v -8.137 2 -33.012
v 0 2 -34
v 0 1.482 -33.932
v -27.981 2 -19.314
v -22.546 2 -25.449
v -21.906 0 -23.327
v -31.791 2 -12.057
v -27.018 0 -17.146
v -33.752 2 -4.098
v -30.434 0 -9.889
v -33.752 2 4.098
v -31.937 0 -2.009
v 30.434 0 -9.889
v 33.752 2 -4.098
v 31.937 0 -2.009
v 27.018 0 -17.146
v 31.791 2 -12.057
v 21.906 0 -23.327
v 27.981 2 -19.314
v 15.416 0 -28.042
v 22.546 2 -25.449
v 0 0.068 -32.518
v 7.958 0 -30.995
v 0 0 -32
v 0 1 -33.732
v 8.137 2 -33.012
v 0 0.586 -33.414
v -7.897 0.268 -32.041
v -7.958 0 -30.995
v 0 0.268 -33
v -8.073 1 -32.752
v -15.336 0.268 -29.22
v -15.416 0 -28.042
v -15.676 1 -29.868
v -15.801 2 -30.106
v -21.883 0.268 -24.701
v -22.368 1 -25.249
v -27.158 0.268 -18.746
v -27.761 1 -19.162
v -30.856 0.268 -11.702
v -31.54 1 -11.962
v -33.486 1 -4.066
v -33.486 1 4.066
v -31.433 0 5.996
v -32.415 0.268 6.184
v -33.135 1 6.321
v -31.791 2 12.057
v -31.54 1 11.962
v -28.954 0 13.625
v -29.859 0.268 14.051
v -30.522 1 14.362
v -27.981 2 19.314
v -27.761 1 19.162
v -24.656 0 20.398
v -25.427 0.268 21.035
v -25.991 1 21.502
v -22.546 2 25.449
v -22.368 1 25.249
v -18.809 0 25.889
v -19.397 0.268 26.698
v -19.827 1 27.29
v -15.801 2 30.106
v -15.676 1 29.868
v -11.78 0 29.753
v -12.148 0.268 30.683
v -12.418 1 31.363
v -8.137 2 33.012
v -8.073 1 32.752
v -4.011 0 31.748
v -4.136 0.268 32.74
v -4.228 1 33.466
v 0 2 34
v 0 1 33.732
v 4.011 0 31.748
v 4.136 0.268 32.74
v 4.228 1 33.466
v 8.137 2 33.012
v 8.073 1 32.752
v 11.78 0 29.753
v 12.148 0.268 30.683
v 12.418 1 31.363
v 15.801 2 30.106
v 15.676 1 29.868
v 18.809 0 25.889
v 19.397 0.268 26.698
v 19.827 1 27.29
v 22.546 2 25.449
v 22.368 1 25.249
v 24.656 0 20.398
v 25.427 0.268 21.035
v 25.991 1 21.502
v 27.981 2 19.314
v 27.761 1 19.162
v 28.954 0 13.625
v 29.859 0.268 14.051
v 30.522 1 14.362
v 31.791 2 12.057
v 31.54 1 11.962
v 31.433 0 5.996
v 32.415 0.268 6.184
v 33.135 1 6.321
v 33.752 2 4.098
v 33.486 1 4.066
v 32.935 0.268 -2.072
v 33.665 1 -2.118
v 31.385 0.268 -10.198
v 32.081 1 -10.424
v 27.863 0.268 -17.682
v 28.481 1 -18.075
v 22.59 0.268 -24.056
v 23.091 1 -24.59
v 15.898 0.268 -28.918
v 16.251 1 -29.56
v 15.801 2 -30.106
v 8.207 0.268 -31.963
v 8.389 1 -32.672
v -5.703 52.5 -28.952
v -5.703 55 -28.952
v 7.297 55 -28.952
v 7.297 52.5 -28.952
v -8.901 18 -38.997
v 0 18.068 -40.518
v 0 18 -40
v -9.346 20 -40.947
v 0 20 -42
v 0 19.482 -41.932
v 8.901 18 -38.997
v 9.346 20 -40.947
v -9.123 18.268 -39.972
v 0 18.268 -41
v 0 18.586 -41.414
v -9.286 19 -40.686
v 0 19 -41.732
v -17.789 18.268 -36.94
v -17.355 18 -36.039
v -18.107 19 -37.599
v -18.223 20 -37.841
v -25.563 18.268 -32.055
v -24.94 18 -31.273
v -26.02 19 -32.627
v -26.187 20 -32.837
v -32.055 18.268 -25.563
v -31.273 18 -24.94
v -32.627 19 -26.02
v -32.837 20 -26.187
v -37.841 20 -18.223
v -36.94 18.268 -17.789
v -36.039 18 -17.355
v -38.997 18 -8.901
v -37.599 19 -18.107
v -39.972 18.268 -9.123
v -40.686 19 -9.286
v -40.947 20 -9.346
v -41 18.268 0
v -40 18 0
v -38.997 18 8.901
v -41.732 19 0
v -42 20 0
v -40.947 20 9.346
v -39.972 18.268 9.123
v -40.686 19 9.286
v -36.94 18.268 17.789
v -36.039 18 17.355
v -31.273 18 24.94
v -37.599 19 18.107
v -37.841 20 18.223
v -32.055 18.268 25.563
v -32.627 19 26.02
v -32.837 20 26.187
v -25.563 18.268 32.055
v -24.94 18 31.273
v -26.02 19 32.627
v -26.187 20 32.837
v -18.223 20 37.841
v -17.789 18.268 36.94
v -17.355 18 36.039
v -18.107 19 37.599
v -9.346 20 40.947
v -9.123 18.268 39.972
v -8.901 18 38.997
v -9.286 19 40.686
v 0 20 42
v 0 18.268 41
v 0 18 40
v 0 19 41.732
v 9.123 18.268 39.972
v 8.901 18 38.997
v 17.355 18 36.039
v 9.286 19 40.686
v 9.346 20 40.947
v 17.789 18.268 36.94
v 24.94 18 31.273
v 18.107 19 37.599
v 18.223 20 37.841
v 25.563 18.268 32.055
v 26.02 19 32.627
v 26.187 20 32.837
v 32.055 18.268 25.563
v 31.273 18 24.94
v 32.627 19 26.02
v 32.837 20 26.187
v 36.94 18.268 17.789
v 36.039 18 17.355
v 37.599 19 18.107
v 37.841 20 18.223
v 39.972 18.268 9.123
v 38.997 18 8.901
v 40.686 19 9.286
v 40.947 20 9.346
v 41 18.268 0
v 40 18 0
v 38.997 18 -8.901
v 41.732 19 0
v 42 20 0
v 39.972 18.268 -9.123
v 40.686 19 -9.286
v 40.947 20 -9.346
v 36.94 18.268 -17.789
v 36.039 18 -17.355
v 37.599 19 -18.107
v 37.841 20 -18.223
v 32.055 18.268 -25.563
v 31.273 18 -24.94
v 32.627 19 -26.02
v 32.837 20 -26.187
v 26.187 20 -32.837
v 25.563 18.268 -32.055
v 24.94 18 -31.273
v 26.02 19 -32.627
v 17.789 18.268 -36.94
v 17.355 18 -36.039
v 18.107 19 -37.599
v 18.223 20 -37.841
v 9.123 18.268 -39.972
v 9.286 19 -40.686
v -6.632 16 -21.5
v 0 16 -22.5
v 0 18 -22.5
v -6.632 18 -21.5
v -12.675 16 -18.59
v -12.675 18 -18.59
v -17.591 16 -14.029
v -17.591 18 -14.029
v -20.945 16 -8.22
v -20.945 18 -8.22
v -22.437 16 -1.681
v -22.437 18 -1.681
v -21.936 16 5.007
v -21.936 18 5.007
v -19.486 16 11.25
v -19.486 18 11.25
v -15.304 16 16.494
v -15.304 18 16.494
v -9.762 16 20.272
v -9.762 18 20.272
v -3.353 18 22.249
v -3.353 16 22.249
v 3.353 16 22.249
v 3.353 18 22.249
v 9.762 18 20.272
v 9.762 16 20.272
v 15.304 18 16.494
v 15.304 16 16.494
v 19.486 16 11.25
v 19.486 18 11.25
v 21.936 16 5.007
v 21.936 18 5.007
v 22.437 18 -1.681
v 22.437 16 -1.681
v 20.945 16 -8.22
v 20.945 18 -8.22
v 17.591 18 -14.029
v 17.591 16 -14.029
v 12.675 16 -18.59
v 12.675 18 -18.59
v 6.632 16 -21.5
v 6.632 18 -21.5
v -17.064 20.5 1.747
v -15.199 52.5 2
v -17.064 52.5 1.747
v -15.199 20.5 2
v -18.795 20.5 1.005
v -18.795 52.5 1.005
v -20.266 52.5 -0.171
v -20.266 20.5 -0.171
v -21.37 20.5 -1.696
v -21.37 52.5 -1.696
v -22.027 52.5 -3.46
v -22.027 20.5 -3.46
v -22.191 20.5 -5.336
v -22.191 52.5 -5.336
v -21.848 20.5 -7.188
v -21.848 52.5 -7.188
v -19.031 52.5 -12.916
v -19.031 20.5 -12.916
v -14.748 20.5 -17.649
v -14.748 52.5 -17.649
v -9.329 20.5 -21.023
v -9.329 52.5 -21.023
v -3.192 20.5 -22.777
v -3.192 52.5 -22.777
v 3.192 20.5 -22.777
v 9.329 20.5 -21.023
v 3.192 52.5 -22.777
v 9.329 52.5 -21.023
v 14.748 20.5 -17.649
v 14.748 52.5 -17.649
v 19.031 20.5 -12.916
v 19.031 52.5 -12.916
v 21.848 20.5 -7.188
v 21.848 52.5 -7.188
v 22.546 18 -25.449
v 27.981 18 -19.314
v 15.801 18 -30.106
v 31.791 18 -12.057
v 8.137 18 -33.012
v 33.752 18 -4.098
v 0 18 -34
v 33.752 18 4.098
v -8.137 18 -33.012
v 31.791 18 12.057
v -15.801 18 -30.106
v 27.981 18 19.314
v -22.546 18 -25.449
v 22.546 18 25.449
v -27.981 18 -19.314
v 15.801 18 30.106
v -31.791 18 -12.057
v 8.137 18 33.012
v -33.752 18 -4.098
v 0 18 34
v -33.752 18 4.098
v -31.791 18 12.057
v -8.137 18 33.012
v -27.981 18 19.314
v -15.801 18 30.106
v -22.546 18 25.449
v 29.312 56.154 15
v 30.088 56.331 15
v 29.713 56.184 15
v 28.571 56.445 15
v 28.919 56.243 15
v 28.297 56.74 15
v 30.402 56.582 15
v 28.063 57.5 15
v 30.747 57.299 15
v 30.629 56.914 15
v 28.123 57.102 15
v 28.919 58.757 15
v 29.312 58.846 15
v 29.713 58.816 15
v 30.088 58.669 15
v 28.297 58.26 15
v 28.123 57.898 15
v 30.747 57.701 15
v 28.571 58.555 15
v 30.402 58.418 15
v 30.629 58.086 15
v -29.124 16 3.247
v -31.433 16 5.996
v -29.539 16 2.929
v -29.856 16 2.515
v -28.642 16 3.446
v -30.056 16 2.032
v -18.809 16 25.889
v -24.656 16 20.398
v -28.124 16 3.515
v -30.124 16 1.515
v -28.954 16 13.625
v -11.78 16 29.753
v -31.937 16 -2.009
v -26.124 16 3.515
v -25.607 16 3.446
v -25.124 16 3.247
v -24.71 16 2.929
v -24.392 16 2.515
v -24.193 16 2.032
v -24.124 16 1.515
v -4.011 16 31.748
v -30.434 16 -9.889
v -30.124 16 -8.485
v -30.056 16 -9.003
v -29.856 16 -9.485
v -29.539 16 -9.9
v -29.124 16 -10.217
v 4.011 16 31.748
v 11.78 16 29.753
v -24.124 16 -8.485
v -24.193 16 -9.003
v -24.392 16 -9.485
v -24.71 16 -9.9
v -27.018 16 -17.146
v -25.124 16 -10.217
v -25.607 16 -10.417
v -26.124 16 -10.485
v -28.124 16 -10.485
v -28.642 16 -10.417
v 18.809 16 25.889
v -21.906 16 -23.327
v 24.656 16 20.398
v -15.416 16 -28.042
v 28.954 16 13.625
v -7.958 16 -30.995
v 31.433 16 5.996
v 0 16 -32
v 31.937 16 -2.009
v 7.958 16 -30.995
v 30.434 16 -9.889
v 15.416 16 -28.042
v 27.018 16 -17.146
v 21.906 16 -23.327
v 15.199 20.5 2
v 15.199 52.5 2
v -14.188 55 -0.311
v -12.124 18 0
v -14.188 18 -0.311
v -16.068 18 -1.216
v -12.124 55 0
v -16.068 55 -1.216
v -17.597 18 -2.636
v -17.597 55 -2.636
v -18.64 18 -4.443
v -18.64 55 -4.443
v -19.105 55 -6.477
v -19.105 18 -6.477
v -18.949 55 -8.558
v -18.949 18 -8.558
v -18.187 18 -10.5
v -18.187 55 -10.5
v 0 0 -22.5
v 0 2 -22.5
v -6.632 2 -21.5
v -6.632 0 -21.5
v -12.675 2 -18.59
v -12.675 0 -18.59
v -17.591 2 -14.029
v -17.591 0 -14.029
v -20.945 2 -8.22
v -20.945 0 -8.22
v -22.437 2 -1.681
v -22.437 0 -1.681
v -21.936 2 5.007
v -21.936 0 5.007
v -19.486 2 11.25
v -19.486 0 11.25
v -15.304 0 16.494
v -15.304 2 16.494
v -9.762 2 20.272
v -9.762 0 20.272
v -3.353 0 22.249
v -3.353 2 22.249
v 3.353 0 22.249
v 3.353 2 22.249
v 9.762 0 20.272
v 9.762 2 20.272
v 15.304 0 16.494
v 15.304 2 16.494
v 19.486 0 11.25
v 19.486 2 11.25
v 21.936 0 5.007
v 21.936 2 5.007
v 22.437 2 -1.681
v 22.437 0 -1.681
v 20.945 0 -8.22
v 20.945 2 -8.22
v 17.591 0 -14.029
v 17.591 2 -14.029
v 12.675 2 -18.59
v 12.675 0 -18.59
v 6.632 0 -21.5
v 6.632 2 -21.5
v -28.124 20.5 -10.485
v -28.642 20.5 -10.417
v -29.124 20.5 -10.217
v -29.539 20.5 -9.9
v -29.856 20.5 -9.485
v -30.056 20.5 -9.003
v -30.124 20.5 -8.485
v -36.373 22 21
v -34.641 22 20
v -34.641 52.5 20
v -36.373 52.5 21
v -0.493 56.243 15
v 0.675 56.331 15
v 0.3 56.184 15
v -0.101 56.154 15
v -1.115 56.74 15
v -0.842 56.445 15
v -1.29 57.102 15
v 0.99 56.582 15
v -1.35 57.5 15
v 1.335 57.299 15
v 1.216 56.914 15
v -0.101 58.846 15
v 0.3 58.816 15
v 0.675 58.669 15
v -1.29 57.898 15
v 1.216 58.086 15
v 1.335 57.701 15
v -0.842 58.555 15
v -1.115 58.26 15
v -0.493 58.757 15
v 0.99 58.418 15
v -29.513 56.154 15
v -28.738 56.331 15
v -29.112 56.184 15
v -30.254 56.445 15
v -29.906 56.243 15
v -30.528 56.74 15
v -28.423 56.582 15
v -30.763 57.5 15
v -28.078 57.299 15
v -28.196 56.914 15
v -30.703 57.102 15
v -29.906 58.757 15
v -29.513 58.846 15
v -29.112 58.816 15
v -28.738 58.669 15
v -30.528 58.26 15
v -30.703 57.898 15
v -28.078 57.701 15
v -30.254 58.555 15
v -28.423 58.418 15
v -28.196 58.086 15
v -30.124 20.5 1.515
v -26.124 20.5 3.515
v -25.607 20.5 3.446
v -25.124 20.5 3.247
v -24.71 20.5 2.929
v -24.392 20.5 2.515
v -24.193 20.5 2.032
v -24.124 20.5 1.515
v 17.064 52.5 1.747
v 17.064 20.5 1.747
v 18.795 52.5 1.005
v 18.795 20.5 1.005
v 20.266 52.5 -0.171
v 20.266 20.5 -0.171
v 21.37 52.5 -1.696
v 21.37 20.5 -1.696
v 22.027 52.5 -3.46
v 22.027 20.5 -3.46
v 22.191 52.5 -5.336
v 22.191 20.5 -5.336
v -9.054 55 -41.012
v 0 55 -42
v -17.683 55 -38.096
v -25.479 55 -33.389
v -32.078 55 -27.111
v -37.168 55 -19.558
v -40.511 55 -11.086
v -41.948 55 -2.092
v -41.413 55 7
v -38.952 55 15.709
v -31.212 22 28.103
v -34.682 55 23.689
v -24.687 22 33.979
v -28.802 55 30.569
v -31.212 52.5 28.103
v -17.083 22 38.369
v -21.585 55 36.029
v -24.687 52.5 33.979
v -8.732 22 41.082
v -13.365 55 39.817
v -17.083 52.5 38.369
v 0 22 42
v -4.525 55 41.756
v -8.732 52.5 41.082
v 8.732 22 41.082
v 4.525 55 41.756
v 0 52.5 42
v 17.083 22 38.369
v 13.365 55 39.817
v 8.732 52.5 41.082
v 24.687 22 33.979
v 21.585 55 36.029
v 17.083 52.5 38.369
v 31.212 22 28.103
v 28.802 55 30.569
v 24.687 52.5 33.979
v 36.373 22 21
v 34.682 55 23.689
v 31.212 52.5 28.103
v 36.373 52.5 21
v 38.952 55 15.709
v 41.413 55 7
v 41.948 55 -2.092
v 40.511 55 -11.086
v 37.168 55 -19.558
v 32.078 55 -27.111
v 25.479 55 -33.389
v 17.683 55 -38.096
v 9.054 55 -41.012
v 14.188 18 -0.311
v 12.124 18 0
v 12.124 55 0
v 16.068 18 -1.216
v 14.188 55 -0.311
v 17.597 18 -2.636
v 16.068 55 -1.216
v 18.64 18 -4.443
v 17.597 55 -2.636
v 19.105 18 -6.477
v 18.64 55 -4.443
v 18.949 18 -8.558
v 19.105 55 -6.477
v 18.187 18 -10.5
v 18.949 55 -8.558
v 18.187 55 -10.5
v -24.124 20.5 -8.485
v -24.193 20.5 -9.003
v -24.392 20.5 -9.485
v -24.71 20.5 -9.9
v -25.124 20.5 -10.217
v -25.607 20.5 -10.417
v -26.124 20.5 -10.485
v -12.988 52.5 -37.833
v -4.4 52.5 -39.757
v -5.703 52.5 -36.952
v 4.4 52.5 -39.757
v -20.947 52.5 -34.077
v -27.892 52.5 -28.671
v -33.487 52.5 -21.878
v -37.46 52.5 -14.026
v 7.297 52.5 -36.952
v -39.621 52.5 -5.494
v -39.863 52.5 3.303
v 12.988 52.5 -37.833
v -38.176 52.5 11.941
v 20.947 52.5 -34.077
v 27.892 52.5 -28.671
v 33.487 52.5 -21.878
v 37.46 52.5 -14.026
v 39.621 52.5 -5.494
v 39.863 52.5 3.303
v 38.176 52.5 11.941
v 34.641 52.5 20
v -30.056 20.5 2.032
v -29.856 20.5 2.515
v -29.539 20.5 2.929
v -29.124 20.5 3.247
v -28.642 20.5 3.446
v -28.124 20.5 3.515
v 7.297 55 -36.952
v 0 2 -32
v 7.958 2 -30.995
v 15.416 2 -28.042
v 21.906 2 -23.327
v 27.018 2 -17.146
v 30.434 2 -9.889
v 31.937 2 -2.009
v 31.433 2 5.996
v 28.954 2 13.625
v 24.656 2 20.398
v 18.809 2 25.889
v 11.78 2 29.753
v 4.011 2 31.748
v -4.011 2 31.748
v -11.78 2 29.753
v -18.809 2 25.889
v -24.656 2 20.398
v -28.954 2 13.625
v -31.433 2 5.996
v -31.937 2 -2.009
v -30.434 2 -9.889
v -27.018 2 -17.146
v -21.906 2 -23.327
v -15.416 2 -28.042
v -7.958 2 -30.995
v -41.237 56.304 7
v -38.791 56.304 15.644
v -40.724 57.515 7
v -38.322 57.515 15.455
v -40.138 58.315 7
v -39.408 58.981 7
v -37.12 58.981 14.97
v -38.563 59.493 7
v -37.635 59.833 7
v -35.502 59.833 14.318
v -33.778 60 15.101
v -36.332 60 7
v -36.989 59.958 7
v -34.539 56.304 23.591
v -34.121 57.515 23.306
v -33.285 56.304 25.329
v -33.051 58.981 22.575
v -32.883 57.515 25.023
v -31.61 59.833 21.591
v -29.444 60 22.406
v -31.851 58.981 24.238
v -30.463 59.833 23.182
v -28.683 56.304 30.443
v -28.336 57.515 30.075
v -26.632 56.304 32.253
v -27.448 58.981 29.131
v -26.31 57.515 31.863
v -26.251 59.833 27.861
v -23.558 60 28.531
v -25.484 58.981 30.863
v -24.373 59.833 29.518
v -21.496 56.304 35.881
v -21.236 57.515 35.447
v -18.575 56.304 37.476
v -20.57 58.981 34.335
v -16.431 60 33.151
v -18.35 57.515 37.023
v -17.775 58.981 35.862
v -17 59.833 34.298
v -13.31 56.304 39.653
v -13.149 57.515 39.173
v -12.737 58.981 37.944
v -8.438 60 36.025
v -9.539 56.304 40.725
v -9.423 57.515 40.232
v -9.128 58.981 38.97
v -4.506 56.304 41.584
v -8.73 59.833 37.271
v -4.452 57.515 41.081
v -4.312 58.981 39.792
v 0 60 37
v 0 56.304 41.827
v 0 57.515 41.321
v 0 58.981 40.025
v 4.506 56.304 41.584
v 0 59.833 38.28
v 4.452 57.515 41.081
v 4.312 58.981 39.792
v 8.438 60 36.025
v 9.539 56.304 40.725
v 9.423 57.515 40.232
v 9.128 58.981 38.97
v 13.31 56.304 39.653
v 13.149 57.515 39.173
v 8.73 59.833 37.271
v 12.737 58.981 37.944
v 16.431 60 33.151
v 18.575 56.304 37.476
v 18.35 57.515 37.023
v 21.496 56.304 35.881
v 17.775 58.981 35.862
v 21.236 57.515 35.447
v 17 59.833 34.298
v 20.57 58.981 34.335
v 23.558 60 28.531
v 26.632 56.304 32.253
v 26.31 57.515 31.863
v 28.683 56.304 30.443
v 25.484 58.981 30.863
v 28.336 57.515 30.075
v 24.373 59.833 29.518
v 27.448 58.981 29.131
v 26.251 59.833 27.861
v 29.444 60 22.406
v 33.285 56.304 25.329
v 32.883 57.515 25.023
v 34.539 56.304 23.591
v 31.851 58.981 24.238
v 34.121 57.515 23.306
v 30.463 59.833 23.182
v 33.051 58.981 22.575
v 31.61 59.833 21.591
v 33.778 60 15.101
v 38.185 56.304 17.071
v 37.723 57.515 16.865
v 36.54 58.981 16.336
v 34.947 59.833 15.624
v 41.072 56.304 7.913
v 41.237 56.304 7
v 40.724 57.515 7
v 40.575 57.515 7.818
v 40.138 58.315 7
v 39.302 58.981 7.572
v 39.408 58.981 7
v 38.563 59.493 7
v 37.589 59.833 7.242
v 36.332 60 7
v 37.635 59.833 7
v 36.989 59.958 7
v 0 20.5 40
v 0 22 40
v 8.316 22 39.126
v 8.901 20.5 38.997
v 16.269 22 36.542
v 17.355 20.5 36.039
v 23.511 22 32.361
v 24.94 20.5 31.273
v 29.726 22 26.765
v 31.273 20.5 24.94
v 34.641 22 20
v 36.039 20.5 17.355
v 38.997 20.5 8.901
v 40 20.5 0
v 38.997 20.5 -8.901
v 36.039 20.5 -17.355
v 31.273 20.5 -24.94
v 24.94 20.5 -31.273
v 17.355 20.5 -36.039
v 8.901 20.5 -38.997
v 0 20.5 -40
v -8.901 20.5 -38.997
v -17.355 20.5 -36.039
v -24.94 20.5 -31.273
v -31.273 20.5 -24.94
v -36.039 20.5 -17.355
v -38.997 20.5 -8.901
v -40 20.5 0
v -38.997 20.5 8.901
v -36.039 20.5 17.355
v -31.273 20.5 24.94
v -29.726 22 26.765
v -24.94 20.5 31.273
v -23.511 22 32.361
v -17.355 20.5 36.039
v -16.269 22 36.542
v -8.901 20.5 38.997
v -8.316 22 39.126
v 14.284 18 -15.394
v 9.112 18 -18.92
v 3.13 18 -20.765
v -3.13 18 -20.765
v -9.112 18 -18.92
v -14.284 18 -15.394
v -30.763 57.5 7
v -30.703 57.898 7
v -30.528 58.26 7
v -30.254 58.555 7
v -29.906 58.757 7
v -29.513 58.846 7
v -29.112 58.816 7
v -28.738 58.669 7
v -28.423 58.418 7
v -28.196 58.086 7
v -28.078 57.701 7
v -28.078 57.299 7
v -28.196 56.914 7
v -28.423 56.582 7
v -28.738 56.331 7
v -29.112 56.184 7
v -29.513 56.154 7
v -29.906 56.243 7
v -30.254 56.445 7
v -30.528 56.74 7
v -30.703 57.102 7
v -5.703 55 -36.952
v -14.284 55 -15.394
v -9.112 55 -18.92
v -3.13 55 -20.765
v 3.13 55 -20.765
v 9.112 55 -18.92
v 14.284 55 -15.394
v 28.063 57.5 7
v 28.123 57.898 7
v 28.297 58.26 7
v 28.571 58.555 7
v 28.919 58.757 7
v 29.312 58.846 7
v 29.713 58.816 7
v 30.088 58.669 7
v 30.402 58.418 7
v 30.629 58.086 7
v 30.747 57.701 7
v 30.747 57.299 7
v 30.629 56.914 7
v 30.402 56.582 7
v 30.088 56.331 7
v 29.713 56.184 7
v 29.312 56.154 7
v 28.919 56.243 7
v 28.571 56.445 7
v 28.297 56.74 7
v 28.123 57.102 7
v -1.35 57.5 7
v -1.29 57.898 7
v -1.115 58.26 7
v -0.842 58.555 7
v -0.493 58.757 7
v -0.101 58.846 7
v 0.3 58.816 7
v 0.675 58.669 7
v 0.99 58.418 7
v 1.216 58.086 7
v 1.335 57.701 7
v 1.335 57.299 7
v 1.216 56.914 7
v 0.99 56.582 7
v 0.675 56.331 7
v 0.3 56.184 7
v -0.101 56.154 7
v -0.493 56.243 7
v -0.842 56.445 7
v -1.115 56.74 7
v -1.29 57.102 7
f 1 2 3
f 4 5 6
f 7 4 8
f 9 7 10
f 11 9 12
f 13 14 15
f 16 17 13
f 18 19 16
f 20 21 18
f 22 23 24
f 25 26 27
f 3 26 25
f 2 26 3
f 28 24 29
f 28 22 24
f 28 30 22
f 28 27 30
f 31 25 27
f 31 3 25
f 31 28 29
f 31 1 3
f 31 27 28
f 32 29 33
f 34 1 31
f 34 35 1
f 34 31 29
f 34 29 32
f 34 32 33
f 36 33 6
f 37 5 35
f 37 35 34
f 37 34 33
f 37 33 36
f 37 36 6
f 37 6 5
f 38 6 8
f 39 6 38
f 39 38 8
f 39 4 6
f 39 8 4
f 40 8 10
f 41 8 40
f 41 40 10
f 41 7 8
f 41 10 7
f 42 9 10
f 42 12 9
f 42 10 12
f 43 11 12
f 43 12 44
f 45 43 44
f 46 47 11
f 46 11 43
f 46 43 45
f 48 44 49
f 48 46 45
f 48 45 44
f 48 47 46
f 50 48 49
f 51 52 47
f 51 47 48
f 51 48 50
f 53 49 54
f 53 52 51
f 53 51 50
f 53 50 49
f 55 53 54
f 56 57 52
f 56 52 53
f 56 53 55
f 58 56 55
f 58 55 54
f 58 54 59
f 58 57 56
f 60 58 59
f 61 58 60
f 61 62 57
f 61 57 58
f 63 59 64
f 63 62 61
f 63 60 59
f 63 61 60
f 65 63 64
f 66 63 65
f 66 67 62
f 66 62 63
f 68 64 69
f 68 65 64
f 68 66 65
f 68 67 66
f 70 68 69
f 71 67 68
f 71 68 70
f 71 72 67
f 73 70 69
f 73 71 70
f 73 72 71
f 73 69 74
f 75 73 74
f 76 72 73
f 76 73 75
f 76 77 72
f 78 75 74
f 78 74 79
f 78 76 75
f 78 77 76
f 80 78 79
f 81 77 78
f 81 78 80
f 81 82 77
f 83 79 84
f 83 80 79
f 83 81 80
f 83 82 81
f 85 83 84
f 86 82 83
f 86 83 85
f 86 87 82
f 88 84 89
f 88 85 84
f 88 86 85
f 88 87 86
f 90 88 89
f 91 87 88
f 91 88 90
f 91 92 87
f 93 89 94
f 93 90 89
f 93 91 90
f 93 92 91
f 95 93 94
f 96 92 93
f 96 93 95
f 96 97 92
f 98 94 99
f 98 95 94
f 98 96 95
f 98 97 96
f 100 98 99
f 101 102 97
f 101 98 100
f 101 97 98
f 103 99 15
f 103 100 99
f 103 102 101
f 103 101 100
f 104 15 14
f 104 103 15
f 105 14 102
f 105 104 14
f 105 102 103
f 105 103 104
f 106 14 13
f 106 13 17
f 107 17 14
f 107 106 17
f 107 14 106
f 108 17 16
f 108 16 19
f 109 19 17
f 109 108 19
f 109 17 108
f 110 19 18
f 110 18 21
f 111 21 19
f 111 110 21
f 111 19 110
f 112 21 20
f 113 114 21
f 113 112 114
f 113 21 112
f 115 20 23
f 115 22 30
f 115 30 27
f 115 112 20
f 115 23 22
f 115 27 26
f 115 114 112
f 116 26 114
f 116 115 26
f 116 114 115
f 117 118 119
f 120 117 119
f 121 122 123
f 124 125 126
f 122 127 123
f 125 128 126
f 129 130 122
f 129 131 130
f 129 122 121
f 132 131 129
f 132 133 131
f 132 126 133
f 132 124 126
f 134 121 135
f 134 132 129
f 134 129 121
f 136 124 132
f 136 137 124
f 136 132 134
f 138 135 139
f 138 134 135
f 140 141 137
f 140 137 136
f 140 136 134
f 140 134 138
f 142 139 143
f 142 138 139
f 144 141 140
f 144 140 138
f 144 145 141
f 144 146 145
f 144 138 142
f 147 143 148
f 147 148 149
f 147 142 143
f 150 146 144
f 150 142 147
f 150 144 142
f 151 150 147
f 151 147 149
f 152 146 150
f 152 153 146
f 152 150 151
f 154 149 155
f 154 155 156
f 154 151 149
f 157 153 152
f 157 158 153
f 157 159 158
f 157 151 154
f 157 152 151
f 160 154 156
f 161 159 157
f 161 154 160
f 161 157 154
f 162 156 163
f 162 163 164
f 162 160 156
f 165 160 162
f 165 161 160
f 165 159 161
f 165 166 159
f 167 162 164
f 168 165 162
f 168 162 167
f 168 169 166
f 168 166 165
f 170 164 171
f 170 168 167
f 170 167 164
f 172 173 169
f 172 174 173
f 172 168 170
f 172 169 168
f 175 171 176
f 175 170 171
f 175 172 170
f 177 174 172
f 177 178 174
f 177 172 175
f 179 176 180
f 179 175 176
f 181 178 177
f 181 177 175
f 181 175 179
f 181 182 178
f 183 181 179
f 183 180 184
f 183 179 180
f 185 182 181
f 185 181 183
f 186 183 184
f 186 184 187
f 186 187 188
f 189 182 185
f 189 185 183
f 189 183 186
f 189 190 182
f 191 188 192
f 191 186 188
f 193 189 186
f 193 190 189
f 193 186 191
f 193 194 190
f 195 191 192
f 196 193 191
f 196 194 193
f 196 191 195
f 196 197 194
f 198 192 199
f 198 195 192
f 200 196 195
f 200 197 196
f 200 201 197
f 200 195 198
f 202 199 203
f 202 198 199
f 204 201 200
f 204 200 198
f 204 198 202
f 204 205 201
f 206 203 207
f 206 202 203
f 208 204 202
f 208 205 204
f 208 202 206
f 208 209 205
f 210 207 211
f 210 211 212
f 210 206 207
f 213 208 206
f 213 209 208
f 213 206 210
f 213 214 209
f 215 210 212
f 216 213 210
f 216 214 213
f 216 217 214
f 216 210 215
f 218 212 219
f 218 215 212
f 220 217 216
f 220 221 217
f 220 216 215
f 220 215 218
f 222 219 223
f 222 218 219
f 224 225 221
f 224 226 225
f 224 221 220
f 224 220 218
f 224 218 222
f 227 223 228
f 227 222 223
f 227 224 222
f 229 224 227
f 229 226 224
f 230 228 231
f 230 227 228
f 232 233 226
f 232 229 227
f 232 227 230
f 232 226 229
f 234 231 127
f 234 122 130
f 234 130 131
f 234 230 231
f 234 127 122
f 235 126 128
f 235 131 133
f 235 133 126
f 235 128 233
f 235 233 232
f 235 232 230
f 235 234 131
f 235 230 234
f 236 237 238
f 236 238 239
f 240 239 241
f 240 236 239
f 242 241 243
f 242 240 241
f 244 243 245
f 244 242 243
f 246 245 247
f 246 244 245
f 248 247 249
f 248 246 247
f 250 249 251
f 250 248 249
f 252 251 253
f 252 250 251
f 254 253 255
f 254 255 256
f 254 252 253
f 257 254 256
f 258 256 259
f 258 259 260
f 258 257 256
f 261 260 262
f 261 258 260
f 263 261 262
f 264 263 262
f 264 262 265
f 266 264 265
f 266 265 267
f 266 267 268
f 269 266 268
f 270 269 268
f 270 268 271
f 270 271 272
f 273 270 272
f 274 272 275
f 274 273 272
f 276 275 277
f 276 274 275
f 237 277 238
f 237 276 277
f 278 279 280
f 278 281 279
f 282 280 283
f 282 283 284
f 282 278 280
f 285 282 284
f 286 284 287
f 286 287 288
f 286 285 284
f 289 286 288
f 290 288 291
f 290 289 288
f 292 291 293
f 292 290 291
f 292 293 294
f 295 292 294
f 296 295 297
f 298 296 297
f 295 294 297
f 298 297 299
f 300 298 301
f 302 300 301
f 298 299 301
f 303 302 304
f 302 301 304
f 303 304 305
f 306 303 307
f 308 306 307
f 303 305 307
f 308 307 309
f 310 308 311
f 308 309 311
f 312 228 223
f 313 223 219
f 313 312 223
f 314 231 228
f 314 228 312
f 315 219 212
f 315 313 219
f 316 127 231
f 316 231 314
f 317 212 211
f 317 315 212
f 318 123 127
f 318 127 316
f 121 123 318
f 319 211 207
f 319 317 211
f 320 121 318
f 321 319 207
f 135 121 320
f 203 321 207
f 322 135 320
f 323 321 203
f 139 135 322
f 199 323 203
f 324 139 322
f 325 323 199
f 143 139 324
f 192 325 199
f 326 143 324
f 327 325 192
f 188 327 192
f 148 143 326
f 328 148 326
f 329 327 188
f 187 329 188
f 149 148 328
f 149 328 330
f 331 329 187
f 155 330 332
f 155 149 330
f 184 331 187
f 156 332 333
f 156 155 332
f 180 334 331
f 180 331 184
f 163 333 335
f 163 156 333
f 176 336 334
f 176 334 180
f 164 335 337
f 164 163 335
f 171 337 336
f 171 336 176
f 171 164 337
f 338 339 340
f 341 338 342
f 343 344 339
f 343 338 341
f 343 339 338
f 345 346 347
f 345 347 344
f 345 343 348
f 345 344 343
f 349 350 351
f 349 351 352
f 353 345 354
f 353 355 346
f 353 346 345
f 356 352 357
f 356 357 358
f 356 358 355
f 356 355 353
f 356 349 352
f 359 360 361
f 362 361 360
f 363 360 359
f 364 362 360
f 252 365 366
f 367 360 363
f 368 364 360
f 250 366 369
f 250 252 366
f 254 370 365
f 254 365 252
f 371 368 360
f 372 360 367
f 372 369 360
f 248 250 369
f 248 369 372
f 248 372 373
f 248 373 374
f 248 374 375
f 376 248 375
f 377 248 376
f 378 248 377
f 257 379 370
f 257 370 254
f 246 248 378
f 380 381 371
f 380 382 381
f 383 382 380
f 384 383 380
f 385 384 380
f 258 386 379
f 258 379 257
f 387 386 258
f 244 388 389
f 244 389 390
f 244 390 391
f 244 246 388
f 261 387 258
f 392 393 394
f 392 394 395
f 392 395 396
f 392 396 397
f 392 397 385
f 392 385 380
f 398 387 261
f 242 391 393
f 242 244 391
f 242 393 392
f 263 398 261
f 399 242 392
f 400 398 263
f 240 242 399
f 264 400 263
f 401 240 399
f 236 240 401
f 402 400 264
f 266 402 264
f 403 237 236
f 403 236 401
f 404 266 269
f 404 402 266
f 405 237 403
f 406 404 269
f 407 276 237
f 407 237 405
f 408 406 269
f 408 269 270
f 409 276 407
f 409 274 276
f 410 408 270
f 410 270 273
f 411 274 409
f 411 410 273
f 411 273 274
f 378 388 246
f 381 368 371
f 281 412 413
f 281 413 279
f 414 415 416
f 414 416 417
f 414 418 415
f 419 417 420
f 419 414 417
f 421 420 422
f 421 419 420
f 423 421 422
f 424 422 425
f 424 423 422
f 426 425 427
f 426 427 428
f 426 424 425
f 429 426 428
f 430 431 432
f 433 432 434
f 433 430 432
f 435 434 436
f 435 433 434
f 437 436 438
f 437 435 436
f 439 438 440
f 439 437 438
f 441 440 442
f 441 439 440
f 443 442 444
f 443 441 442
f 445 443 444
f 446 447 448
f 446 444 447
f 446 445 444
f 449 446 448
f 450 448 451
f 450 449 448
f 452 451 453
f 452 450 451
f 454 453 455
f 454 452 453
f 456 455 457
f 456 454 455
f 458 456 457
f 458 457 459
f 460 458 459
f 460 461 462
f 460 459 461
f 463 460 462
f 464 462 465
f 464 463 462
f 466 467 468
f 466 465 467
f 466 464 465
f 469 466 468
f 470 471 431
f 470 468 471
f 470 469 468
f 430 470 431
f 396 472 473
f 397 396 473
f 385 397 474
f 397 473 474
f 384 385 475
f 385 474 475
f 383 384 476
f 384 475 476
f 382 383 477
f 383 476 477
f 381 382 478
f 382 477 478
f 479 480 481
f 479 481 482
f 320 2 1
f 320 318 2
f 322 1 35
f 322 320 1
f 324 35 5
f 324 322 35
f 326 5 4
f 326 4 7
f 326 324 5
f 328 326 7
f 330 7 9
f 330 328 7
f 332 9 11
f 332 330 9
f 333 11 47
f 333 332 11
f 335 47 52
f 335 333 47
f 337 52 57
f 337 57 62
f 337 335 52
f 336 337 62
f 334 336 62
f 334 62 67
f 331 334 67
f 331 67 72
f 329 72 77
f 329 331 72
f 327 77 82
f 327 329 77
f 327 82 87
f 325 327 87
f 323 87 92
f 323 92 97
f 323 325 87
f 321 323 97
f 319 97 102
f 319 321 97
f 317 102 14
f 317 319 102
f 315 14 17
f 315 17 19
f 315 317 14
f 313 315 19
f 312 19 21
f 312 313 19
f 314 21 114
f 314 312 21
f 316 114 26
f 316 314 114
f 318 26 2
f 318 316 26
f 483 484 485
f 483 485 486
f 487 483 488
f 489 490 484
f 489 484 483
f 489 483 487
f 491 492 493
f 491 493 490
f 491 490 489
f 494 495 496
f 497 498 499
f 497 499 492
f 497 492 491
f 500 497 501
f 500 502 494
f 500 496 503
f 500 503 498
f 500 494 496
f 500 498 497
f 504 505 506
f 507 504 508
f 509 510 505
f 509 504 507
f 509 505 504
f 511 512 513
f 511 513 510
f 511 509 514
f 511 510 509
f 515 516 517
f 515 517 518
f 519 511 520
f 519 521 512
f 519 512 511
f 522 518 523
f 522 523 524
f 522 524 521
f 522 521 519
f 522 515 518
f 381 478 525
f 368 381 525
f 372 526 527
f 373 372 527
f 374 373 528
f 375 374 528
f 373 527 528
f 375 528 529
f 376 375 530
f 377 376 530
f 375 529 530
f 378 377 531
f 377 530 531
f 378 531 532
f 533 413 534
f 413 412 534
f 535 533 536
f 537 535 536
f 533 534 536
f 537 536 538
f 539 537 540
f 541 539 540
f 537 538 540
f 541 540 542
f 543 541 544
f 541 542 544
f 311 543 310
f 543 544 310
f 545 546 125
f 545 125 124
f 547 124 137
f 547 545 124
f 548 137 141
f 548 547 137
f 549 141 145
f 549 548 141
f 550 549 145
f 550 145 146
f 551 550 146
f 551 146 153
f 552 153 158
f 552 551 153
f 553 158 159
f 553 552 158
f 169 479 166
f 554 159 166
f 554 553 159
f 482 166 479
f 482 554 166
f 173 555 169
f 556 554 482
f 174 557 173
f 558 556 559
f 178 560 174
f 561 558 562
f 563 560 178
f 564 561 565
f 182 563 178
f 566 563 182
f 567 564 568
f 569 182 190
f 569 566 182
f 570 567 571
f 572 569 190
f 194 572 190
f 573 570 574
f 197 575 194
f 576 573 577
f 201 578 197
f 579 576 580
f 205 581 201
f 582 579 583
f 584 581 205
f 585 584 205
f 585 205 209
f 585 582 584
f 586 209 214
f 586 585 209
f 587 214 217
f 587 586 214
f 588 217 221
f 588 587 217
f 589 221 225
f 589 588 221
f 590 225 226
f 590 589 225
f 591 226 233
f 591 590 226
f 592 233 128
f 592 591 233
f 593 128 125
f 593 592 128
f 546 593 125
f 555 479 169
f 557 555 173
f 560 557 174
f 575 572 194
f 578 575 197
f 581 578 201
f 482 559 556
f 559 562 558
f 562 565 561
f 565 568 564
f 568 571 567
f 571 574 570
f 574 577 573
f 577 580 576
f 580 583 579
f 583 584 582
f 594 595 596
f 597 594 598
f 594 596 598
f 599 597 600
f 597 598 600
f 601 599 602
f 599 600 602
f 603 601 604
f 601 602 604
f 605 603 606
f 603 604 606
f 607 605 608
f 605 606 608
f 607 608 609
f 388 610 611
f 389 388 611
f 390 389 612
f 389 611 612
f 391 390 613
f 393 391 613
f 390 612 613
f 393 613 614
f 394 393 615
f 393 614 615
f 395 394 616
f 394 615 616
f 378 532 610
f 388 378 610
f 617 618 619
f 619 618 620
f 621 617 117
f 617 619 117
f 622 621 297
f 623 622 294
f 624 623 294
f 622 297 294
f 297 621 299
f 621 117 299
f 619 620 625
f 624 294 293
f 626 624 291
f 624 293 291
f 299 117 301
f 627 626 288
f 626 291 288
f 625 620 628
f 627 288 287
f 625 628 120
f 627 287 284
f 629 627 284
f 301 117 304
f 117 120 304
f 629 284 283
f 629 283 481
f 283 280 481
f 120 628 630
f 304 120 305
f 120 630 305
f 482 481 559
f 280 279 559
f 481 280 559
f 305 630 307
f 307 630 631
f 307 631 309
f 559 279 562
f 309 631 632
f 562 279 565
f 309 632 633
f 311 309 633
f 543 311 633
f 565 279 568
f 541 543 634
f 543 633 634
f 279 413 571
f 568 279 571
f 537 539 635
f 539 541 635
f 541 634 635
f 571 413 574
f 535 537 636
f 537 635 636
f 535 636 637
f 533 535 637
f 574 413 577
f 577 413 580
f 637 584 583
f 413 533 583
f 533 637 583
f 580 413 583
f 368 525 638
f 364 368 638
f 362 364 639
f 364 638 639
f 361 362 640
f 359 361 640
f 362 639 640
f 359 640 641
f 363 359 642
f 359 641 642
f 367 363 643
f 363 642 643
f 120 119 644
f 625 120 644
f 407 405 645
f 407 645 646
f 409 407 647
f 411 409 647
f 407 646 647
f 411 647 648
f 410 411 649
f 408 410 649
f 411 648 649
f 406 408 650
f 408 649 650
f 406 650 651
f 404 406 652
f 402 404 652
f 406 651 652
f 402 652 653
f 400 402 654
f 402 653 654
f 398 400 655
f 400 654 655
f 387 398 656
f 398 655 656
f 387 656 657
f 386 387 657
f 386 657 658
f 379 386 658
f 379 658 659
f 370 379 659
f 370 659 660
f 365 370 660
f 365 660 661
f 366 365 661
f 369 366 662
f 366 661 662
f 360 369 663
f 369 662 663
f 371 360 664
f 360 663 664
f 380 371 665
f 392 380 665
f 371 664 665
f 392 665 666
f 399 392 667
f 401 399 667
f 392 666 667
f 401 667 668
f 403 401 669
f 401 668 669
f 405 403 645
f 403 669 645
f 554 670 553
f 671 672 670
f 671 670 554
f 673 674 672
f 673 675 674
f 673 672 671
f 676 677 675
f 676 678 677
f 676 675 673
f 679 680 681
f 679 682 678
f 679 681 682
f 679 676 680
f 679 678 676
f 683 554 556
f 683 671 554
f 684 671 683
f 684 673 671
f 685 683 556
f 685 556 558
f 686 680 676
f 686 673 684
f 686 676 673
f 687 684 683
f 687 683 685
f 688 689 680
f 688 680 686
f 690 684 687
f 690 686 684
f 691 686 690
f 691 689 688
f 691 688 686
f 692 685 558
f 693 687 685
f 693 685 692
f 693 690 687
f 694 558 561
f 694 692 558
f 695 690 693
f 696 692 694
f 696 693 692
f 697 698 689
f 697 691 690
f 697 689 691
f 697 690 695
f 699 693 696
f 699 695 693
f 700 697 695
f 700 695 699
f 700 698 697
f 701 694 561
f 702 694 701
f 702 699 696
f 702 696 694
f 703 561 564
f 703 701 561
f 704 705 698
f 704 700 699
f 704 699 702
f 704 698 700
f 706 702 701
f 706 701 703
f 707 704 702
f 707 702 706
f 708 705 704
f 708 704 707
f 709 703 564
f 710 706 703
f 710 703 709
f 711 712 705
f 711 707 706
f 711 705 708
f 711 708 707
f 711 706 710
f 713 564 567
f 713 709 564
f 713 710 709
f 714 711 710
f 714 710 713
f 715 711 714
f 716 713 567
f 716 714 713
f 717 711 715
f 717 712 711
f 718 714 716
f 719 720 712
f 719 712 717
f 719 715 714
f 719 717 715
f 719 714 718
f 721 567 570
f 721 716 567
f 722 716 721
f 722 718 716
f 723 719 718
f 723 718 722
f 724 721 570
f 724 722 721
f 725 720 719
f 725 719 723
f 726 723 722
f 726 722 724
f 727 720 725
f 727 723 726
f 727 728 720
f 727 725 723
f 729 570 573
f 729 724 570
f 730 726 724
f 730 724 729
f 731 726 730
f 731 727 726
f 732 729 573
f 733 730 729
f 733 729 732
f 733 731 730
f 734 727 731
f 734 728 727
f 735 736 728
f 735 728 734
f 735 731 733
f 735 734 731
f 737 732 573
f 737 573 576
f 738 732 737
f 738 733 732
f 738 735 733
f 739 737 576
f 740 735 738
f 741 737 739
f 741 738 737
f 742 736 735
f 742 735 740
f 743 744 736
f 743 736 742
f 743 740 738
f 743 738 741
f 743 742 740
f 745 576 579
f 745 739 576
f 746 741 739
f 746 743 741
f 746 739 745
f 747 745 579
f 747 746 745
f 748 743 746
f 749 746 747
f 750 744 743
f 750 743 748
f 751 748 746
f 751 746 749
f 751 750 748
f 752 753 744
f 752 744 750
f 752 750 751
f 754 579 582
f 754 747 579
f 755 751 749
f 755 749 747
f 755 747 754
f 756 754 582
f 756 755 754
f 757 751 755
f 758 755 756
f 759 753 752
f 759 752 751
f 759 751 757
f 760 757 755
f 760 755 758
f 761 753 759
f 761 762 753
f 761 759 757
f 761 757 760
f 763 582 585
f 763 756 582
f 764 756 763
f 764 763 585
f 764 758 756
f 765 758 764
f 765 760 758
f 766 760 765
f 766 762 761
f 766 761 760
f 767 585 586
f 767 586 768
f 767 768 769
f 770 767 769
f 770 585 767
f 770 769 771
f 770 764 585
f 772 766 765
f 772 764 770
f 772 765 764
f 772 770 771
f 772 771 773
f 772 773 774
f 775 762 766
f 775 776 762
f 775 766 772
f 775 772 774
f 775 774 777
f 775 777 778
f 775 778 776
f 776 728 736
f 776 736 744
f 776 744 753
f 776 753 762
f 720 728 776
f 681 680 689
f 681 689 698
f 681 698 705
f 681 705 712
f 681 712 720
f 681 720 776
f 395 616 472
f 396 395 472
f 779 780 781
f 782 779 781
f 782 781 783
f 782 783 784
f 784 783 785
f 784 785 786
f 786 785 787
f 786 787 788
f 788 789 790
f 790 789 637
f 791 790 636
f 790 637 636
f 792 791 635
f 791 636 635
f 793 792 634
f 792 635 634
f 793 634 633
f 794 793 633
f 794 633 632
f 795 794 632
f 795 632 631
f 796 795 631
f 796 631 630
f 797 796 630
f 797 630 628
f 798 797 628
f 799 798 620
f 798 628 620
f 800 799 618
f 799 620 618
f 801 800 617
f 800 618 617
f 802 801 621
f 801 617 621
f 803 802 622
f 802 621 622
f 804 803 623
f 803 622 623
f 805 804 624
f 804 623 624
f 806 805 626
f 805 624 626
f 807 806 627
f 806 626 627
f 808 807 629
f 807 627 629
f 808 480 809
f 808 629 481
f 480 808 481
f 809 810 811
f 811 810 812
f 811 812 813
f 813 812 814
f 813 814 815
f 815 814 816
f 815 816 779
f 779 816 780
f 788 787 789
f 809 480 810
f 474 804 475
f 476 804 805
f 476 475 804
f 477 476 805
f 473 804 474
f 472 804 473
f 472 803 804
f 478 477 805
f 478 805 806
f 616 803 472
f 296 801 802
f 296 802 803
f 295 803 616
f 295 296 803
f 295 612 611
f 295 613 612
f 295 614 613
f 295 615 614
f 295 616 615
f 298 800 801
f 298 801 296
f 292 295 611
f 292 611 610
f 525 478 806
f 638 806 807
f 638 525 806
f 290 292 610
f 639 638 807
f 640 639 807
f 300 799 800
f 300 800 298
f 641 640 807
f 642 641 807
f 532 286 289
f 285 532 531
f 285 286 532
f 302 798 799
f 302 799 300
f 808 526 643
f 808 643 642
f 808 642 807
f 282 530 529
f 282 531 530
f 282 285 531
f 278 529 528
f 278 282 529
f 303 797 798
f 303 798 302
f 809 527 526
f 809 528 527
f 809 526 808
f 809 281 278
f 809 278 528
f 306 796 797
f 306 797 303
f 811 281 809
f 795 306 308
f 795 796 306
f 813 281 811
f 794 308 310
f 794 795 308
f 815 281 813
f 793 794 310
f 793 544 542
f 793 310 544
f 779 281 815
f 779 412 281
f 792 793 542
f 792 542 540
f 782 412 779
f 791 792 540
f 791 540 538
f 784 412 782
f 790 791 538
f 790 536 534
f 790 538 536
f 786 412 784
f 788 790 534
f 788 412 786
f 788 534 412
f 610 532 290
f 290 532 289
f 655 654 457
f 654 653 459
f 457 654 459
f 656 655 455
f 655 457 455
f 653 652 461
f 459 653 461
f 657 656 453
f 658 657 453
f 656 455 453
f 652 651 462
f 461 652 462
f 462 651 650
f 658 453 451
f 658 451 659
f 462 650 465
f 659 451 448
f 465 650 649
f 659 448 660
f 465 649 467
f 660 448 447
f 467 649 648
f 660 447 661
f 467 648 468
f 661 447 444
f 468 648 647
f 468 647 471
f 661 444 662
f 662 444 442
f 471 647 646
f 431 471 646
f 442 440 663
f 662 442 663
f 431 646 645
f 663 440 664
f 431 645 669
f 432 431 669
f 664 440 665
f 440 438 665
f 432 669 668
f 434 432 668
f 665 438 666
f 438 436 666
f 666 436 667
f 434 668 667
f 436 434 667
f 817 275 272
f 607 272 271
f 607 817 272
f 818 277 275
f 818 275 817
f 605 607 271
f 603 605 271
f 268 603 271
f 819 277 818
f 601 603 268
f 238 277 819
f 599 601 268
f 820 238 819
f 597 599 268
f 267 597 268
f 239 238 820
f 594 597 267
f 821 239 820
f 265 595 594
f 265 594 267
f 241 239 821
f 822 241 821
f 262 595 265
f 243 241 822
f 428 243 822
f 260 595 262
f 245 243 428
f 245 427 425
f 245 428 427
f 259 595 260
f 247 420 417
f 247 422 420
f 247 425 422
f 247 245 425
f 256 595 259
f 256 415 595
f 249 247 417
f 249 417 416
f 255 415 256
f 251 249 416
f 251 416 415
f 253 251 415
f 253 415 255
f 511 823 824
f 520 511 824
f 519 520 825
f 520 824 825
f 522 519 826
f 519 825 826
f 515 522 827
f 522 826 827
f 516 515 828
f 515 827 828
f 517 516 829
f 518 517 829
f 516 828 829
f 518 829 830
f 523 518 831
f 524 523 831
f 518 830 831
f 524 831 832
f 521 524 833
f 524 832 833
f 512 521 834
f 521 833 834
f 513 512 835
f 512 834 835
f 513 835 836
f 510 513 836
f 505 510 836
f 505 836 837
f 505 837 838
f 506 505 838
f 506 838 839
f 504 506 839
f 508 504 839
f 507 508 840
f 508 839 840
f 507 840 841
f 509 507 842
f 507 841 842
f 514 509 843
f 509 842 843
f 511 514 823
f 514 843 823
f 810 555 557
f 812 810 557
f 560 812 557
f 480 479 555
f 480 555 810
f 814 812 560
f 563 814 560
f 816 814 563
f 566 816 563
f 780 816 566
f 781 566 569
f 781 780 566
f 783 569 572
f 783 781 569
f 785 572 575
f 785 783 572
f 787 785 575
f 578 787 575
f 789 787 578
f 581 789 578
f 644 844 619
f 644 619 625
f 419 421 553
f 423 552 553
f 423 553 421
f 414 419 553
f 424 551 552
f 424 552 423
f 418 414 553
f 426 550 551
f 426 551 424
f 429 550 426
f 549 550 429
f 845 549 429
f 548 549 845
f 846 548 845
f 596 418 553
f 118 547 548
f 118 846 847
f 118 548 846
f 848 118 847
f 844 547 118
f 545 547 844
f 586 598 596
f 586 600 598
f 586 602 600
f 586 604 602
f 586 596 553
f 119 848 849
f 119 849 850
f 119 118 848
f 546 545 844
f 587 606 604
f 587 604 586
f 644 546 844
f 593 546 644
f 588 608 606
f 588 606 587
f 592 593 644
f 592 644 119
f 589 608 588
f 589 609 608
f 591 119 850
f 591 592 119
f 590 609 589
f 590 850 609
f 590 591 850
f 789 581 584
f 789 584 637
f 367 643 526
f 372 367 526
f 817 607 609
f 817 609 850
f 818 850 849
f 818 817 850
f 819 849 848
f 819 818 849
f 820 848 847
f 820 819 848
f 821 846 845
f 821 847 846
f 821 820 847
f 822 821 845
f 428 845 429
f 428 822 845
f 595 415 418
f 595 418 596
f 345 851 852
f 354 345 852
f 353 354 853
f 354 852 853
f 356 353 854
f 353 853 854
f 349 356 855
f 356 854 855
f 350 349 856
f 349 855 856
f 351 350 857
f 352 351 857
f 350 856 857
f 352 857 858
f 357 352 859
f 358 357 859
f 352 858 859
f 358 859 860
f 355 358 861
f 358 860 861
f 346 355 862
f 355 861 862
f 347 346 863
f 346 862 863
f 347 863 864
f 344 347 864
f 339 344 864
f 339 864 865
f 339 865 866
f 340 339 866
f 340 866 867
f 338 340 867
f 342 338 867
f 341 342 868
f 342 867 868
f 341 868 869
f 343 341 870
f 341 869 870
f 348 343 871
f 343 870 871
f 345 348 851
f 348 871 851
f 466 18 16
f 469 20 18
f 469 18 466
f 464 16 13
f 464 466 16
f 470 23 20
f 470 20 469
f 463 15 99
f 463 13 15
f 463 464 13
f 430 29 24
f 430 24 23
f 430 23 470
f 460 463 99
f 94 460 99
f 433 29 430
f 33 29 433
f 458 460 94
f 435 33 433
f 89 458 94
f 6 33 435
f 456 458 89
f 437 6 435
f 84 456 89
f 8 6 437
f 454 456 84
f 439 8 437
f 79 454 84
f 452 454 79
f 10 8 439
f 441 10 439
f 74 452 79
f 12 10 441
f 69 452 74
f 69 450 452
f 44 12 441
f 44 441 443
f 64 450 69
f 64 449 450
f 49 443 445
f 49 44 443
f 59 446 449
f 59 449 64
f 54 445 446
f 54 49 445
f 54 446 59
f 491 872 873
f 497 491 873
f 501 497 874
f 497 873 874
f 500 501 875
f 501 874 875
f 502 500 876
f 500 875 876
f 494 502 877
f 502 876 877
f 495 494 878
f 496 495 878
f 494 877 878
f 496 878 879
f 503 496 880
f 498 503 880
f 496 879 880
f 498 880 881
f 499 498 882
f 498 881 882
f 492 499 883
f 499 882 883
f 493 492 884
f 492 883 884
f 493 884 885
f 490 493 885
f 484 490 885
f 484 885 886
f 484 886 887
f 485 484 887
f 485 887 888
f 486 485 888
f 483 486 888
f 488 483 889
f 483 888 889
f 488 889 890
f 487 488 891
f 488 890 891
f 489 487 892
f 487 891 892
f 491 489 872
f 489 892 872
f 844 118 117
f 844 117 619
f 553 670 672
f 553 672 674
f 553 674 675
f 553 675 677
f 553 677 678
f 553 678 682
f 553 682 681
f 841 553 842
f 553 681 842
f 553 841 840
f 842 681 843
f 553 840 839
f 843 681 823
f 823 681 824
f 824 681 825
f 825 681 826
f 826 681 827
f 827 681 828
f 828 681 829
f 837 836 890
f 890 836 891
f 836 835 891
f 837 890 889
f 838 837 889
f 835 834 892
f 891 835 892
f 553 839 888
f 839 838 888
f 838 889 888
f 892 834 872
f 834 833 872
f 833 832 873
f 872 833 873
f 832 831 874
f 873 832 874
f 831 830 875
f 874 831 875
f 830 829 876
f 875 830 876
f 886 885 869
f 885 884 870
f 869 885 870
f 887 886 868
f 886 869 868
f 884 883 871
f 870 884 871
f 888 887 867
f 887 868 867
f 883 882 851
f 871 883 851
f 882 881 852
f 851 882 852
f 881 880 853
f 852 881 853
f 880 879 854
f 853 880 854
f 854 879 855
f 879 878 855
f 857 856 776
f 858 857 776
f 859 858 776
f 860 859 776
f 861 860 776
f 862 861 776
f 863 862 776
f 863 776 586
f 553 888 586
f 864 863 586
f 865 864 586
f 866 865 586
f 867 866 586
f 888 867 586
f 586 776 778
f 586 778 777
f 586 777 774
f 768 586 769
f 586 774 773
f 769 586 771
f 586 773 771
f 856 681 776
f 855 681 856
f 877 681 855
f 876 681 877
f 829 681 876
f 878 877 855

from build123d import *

# Parameters (mm, degrees)
CUT_EXTRUDE1_DEPTH  = 5
CUT_EXTRUDE3_DEPTH  = 45
SKETCH8_R           = 40
CUT_EXTRUDE4_DEPTH  = 32
SKETCH9_R           = 32
SKETCH9_R_2         = 24.5
CUT_EXTRUDE5_DEPTH  = 14
SKETCH10_R          = 26
CUT_EXTRUDE6_DEPTH  = 14
FILLET1_R           = 7
FILLET2_R           = 7
CUT_REVOLVE1_START  = 22
CUT_REVOLVE1_DEPTH  = 30.5
CUT_EXTRUDE12_DEPTH = 5
SKETCH18_W          = 13
SKETCH18_H          = 8
CUT_EXTRUDE13_DEPTH = 5
SKETCH20_W          = 84
SKETCH20_H          = 7
CUT_EXTRUDE15_DEPTH = 5
SKETCH19_R          = 1.35
CUT_EXTRUDE14_DEPTH = 8


# Read off the part's stored shape, not the designer's step: Cut-Revolve1
with BuildPart() as part:
    # Sketch1 → Revolve1 (revolve)
    with BuildSketch(Plane.XY, mode=Mode.PRIVATE) as revolve1_sk:
        with BuildLine():
            Line((22.5, 0), (32, 0))
            ThreePointArc((32, 0), (33.414213562, 0.585786438), (34, 2))
            Line((34, 2), (34, 18))
            Line((34, 18), (40, 18))
            ThreePointArc((40, 18), (41.414213562, 18.585786438), (42, 20))
            Line((42, 20), (42, 55))
            ThreePointArc((42, 55), (40.535533906, 58.535533906), (37, 60))
            Line((37, 60), (0, 60))
            Line((0, 60), (0, 18))
            Line((0, 18), (22.5, 18))
            Line((22.5, 18), (22.5, 0))
        make_face()
    revolve(revolve1_sk.sketch.rotate(Axis((0, 2, 0), (0, 1, 0)), 90), axis=Axis((0, 2, 0), (0, 1, 0)))

    # Sketch5 → Cut-Extrude1 (cut)
    with BuildSketch(Plane(origin=(0, 60, 0), x_dir=(1, 0, 0), z_dir=(0, 1, 0))):
        with BuildLine():
            Line((-42, 0), (-40, 0))
            Line((-40, 0), (40, 0))
            Line((40, 0), (42, 0))
            ThreePointArc((42, 0), (0, 42), (-42, 0))
        make_face()
    extrude(amount=-CUT_EXTRUDE1_DEPTH, mode=Mode.SUBTRACT)

    # Sketch7 → Cut-Extrude3 (cut)
    with BuildSketch(Plane.XZ.offset(-18)):
        with BuildLine():
            Line((-21, 0), (21, 0))
            ThreePointArc((21, 0), (0, -21), (-21, 0))
        make_face()
    extrude(amount=-CUT_EXTRUDE3_DEPTH, mode=Mode.SUBTRACT)

    # Sketch8 → Cut-Extrude4 (cut)
    with BuildSketch(Plane(origin=(0, 52.5, 0), x_dir=(1, 0, 0), z_dir=(0, 1, 0))):
        with Locations(Location((0, 0, 0), (0, 0, 270))):
            Circle(SKETCH8_R)
        with BuildLine():
            Line((22.912878475, -2), (-22.912878475, -2))
            ThreePointArc((-22.912878475, -2), (0, 23), (22.912878475, -2))
        make_face(mode=Mode.SUBTRACT)
    extrude(amount=-CUT_EXTRUDE4_DEPTH, mode=Mode.SUBTRACT)

    # Sketch9 → Cut-Extrude5 (cut)
    with BuildSketch(Plane(origin=(0, 2, 0), x_dir=(-1, 0, 0), z_dir=(0, -1, 0))):
        with Locations(Location((0, 0, 0), (0, 0, 90))):
            Circle(SKETCH9_R)
        with Locations(Location((0, 0, 0), (0, 0, 90))):
            Circle(SKETCH9_R_2, mode=Mode.SUBTRACT)
    extrude(amount=-CUT_EXTRUDE5_DEPTH, mode=Mode.SUBTRACT)

    # Sketch10 → Cut-Extrude6 (cut)
    with BuildSketch(Plane(origin=(0, 2, 0), x_dir=(-1, 0, 0), z_dir=(0, -1, 0))):
        Circle(SKETCH10_R)
    extrude(amount=-CUT_EXTRUDE6_DEPTH, mode=Mode.SUBTRACT)

    # Fillet1
    fillet1_edges = [part.edges().sort_by_distance(p)[0] for p in [
        (21, 36.5, 0),
        (-21, 36.5, 0),
    ]]
    fillet(fillet1_edges, radius=FILLET1_R)

    # Fillet2
    fillet2_edges = [part.edges().sort_by_distance(p)[0] for p in [
        (-22.912878475, 36.5, 2),
        (22.912878475, 36.5, 2),
    ]]
    fillet(fillet2_edges, radius=FILLET2_R)

    # Cut-Revolve1 outline → Cut-Revolve1 (cut)
    with BuildSketch(Plane(origin=(0, 0, 0), x_dir=(1, 0, 0), z_dir=(0, 1, 0)).offset(CUT_REVOLVE1_START)):
        with BuildLine():
            Line((-34.641016151, -20), (-36.373066959, -21))
            ThreePointArc((-36.373066959, -21), (0, -42), (36.373066959, -21))
            Line((36.373066959, -21), (34.641016151, -20))
            ThreePointArc((34.641016151, -20), (0, -40), (-34.641016151, -20))
        make_face()
    extrude(amount=CUT_REVOLVE1_DEPTH, mode=Mode.SUBTRACT)

    # Sketch15 → Cut-Extrude12 (cut)
    with BuildSketch(Plane(origin=(0, 20.5, 0), x_dir=(1, 0, 0), z_dir=(0, 1, 0))):
        with BuildLine():
            Line((-28.124355653, -3.514579578), (-26.124355653, -3.514579578))
            ThreePointArc((-26.124355653, -3.514579578), (-24.710142091, -2.928793141), (-24.124355653, -1.514579578))
            Line((-24.124355653, -1.514579578), (-24.124355653, 8.485420422))
            ThreePointArc((-24.124355653, 8.485420422), (-24.710142091, 9.899633984), (-26.124355653, 10.485420422))
            Line((-26.124355653, 10.485420422), (-28.124355653, 10.485420422))
            ThreePointArc((-28.124355653, 10.485420422), (-29.538569215, 9.899633984), (-30.124355653, 8.485420422))
            Line((-30.124355653, 8.485420422), (-30.124355653, -1.514579578))
            ThreePointArc((-30.124355653, -1.514579578), (-29.538569215, -2.928793141), (-28.124355653, -3.514579578))
        make_face()
    extrude(amount=-CUT_EXTRUDE12_DEPTH, mode=Mode.SUBTRACT)

    # Sketch18 → Cut-Extrude13 (cut)
    with BuildSketch(Plane(origin=(0, 55, 0), x_dir=(1, 0, 0), z_dir=(0, 1, 0))):
        with Locations((0.796512215, 32.951769165)):
            Rectangle(SKETCH18_W, SKETCH18_H)
    extrude(amount=-CUT_EXTRUDE13_DEPTH, mode=Mode.SUBTRACT)

    # Sketch20 → Cut-Extrude15 (cut)
    with BuildSketch(Plane(origin=(0, 60, 0), x_dir=(1, 0, 0), z_dir=(0, 1, 0))):
        with Locations((0, -3.5)):
            Rectangle(SKETCH20_W, SKETCH20_H)
    extrude(amount=-CUT_EXTRUDE15_DEPTH, mode=Mode.SUBTRACT)

    # Sketch19 → Cut-Extrude14 (cut)
    with BuildSketch(Plane(origin=(0, 0, 7), x_dir=(-1, 0, 0), z_dir=(0, 0, -1))):
        with Locations((0, 57.5)):
            Circle(SKETCH19_R)
        with Locations((-29.412558482, 57.5)):
            Circle(SKETCH19_R)
        with Locations((29.412558482, 57.5)):
            Circle(SKETCH19_R)
    extrude(amount=-CUT_EXTRUDE14_DEPTH, mode=Mode.SUBTRACT)


solid = part.part
